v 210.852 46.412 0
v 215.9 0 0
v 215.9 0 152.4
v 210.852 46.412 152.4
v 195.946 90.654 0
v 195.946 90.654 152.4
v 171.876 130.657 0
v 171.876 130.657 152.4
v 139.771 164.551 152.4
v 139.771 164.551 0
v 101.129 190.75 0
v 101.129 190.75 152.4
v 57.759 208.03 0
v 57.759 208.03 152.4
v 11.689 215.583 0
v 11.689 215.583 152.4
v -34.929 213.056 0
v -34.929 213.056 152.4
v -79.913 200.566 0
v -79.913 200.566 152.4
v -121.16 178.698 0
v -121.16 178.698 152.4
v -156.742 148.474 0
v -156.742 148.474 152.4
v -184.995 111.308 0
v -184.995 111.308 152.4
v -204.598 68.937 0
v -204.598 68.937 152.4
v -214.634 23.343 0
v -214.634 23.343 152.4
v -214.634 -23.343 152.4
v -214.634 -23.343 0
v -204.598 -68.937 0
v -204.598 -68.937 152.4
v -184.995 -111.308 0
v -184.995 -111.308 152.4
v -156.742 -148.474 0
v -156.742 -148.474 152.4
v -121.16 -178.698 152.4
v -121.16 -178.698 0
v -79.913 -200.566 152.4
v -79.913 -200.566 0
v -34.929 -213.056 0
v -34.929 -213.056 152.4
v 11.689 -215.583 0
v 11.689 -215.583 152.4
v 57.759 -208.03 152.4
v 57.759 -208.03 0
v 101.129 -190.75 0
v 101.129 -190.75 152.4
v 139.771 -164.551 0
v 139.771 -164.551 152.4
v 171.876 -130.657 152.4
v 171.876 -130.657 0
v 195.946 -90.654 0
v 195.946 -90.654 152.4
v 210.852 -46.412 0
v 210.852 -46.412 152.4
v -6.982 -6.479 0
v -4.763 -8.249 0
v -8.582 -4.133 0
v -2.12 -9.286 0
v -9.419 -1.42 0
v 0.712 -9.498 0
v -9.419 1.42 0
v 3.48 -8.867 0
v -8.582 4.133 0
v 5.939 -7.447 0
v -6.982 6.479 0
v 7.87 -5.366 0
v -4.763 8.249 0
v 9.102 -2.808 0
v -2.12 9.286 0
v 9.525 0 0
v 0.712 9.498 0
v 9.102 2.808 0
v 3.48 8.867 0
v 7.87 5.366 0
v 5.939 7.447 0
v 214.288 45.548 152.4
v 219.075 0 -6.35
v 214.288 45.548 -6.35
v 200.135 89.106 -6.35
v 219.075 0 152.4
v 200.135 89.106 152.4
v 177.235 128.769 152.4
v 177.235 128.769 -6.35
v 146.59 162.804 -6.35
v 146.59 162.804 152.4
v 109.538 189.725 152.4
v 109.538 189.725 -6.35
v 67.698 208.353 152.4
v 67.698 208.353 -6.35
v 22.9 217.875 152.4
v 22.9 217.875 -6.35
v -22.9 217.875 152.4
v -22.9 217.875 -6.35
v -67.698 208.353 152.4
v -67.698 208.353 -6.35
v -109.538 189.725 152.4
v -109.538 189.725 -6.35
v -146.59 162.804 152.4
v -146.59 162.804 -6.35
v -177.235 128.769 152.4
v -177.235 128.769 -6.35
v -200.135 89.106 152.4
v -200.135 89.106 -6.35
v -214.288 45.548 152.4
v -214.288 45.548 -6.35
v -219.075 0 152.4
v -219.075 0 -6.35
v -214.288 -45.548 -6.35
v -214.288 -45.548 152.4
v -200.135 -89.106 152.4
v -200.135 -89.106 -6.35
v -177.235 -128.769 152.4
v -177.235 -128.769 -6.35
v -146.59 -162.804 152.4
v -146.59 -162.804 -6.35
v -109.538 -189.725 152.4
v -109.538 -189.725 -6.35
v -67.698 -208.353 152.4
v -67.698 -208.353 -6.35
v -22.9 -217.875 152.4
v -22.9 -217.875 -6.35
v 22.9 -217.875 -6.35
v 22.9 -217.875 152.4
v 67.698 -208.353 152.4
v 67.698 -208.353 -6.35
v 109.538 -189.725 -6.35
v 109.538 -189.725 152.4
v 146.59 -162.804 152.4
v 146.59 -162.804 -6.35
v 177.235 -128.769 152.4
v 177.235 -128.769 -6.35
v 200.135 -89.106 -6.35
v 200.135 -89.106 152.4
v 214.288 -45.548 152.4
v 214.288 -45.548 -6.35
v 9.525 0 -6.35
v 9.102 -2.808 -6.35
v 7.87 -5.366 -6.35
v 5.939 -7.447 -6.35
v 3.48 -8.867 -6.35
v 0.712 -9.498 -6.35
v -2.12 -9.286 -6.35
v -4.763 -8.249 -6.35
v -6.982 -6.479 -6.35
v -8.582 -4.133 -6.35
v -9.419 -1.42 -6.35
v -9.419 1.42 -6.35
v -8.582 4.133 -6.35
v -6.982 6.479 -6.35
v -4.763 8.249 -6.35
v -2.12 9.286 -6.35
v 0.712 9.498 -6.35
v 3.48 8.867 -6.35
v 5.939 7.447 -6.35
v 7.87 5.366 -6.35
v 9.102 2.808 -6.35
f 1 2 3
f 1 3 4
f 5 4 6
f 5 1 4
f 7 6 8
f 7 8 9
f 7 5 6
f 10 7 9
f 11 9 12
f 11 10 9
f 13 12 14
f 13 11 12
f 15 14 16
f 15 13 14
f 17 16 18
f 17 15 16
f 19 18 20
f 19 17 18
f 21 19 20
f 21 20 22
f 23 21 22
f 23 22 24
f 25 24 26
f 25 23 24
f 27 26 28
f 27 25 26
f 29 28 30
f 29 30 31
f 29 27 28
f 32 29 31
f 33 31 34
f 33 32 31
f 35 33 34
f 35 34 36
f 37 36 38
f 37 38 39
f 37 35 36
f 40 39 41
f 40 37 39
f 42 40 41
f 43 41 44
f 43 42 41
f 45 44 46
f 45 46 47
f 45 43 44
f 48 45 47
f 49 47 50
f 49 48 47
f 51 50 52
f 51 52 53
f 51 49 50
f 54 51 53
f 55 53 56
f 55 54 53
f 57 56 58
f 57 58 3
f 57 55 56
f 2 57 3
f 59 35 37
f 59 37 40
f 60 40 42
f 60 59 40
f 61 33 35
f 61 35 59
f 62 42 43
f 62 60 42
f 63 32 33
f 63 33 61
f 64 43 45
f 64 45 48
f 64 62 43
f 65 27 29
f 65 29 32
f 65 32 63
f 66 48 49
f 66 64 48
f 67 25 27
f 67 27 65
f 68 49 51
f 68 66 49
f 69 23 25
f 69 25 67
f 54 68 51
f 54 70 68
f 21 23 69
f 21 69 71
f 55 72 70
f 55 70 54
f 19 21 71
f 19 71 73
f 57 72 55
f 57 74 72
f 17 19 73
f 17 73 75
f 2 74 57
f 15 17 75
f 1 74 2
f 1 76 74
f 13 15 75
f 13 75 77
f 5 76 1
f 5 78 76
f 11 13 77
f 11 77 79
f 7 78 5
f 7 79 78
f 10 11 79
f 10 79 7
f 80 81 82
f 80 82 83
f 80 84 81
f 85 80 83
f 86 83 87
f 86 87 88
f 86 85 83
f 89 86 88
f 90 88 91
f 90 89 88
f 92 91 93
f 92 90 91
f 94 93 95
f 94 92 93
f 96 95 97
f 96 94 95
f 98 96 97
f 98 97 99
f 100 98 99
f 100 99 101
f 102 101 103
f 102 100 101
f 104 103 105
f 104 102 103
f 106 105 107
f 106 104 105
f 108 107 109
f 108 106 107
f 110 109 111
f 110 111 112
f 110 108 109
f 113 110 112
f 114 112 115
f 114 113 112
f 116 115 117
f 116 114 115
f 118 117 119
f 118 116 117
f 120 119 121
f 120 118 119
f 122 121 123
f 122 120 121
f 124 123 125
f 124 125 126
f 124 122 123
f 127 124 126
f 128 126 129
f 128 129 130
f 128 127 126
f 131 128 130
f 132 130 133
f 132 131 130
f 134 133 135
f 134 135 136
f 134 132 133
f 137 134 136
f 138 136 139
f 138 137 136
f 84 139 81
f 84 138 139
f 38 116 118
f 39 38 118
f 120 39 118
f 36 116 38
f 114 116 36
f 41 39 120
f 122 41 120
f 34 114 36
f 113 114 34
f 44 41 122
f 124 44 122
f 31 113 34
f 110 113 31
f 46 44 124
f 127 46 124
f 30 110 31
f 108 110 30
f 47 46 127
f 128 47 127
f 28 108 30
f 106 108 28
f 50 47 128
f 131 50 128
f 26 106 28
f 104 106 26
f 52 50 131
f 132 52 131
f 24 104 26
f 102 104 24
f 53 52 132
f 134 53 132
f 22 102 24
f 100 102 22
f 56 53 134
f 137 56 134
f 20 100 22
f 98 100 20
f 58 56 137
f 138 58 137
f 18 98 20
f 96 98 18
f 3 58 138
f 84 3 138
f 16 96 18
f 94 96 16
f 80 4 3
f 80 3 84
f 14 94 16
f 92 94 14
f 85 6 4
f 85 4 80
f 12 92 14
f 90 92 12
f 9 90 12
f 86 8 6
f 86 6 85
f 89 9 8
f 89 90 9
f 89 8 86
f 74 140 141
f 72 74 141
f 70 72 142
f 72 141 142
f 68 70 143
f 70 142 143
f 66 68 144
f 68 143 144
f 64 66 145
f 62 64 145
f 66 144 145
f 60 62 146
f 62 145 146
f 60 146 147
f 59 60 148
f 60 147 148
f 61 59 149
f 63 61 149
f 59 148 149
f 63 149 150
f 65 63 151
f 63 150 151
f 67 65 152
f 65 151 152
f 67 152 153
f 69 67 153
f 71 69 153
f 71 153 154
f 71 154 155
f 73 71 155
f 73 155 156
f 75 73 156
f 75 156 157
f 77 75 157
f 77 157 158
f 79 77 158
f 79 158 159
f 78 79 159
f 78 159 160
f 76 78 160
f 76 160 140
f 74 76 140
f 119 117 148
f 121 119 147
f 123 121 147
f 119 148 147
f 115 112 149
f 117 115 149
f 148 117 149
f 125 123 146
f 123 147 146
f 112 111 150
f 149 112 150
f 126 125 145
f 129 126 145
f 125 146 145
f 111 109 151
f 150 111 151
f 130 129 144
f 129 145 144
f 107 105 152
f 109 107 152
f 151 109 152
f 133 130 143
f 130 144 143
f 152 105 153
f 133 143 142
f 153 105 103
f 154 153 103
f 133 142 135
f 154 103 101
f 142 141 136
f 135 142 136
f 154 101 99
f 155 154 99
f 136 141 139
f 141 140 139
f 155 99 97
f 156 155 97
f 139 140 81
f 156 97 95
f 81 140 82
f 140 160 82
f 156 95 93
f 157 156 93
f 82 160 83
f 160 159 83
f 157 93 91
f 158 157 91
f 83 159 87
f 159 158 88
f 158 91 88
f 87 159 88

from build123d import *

# Parameters (mm, degrees)
F0_R     = 219.075
F0_R_2   = 215.9
F1_DEPTH = 152.4
F2_R     = 219.075
F3_DEPTH = 6.35
F4_R     = 9.525
F5_DEPTH = 25.4


with BuildPart() as f1:
    # F0 (on Top) → F1 (new body)
    with BuildSketch(Plane.XY):
        Circle(F0_R)
        Circle(F0_R_2, mode=Mode.SUBTRACT)
    extrude(amount=F1_DEPTH)

    # F2 (on Top) → F3 (join)
    with BuildSketch(Plane.XY):
        Circle(F2_R)
    extrude(amount=-F3_DEPTH)

    # F4 (on face) → F5 (cut)
    with BuildSketch(Plane(origin=(0, 0, -6.35), x_dir=(1, 0, 0), z_dir=(0, 0, -1))):
        Circle(F4_R)
    extrude(amount=-F5_DEPTH, mode=Mode.SUBTRACT)


solid = f1.part
